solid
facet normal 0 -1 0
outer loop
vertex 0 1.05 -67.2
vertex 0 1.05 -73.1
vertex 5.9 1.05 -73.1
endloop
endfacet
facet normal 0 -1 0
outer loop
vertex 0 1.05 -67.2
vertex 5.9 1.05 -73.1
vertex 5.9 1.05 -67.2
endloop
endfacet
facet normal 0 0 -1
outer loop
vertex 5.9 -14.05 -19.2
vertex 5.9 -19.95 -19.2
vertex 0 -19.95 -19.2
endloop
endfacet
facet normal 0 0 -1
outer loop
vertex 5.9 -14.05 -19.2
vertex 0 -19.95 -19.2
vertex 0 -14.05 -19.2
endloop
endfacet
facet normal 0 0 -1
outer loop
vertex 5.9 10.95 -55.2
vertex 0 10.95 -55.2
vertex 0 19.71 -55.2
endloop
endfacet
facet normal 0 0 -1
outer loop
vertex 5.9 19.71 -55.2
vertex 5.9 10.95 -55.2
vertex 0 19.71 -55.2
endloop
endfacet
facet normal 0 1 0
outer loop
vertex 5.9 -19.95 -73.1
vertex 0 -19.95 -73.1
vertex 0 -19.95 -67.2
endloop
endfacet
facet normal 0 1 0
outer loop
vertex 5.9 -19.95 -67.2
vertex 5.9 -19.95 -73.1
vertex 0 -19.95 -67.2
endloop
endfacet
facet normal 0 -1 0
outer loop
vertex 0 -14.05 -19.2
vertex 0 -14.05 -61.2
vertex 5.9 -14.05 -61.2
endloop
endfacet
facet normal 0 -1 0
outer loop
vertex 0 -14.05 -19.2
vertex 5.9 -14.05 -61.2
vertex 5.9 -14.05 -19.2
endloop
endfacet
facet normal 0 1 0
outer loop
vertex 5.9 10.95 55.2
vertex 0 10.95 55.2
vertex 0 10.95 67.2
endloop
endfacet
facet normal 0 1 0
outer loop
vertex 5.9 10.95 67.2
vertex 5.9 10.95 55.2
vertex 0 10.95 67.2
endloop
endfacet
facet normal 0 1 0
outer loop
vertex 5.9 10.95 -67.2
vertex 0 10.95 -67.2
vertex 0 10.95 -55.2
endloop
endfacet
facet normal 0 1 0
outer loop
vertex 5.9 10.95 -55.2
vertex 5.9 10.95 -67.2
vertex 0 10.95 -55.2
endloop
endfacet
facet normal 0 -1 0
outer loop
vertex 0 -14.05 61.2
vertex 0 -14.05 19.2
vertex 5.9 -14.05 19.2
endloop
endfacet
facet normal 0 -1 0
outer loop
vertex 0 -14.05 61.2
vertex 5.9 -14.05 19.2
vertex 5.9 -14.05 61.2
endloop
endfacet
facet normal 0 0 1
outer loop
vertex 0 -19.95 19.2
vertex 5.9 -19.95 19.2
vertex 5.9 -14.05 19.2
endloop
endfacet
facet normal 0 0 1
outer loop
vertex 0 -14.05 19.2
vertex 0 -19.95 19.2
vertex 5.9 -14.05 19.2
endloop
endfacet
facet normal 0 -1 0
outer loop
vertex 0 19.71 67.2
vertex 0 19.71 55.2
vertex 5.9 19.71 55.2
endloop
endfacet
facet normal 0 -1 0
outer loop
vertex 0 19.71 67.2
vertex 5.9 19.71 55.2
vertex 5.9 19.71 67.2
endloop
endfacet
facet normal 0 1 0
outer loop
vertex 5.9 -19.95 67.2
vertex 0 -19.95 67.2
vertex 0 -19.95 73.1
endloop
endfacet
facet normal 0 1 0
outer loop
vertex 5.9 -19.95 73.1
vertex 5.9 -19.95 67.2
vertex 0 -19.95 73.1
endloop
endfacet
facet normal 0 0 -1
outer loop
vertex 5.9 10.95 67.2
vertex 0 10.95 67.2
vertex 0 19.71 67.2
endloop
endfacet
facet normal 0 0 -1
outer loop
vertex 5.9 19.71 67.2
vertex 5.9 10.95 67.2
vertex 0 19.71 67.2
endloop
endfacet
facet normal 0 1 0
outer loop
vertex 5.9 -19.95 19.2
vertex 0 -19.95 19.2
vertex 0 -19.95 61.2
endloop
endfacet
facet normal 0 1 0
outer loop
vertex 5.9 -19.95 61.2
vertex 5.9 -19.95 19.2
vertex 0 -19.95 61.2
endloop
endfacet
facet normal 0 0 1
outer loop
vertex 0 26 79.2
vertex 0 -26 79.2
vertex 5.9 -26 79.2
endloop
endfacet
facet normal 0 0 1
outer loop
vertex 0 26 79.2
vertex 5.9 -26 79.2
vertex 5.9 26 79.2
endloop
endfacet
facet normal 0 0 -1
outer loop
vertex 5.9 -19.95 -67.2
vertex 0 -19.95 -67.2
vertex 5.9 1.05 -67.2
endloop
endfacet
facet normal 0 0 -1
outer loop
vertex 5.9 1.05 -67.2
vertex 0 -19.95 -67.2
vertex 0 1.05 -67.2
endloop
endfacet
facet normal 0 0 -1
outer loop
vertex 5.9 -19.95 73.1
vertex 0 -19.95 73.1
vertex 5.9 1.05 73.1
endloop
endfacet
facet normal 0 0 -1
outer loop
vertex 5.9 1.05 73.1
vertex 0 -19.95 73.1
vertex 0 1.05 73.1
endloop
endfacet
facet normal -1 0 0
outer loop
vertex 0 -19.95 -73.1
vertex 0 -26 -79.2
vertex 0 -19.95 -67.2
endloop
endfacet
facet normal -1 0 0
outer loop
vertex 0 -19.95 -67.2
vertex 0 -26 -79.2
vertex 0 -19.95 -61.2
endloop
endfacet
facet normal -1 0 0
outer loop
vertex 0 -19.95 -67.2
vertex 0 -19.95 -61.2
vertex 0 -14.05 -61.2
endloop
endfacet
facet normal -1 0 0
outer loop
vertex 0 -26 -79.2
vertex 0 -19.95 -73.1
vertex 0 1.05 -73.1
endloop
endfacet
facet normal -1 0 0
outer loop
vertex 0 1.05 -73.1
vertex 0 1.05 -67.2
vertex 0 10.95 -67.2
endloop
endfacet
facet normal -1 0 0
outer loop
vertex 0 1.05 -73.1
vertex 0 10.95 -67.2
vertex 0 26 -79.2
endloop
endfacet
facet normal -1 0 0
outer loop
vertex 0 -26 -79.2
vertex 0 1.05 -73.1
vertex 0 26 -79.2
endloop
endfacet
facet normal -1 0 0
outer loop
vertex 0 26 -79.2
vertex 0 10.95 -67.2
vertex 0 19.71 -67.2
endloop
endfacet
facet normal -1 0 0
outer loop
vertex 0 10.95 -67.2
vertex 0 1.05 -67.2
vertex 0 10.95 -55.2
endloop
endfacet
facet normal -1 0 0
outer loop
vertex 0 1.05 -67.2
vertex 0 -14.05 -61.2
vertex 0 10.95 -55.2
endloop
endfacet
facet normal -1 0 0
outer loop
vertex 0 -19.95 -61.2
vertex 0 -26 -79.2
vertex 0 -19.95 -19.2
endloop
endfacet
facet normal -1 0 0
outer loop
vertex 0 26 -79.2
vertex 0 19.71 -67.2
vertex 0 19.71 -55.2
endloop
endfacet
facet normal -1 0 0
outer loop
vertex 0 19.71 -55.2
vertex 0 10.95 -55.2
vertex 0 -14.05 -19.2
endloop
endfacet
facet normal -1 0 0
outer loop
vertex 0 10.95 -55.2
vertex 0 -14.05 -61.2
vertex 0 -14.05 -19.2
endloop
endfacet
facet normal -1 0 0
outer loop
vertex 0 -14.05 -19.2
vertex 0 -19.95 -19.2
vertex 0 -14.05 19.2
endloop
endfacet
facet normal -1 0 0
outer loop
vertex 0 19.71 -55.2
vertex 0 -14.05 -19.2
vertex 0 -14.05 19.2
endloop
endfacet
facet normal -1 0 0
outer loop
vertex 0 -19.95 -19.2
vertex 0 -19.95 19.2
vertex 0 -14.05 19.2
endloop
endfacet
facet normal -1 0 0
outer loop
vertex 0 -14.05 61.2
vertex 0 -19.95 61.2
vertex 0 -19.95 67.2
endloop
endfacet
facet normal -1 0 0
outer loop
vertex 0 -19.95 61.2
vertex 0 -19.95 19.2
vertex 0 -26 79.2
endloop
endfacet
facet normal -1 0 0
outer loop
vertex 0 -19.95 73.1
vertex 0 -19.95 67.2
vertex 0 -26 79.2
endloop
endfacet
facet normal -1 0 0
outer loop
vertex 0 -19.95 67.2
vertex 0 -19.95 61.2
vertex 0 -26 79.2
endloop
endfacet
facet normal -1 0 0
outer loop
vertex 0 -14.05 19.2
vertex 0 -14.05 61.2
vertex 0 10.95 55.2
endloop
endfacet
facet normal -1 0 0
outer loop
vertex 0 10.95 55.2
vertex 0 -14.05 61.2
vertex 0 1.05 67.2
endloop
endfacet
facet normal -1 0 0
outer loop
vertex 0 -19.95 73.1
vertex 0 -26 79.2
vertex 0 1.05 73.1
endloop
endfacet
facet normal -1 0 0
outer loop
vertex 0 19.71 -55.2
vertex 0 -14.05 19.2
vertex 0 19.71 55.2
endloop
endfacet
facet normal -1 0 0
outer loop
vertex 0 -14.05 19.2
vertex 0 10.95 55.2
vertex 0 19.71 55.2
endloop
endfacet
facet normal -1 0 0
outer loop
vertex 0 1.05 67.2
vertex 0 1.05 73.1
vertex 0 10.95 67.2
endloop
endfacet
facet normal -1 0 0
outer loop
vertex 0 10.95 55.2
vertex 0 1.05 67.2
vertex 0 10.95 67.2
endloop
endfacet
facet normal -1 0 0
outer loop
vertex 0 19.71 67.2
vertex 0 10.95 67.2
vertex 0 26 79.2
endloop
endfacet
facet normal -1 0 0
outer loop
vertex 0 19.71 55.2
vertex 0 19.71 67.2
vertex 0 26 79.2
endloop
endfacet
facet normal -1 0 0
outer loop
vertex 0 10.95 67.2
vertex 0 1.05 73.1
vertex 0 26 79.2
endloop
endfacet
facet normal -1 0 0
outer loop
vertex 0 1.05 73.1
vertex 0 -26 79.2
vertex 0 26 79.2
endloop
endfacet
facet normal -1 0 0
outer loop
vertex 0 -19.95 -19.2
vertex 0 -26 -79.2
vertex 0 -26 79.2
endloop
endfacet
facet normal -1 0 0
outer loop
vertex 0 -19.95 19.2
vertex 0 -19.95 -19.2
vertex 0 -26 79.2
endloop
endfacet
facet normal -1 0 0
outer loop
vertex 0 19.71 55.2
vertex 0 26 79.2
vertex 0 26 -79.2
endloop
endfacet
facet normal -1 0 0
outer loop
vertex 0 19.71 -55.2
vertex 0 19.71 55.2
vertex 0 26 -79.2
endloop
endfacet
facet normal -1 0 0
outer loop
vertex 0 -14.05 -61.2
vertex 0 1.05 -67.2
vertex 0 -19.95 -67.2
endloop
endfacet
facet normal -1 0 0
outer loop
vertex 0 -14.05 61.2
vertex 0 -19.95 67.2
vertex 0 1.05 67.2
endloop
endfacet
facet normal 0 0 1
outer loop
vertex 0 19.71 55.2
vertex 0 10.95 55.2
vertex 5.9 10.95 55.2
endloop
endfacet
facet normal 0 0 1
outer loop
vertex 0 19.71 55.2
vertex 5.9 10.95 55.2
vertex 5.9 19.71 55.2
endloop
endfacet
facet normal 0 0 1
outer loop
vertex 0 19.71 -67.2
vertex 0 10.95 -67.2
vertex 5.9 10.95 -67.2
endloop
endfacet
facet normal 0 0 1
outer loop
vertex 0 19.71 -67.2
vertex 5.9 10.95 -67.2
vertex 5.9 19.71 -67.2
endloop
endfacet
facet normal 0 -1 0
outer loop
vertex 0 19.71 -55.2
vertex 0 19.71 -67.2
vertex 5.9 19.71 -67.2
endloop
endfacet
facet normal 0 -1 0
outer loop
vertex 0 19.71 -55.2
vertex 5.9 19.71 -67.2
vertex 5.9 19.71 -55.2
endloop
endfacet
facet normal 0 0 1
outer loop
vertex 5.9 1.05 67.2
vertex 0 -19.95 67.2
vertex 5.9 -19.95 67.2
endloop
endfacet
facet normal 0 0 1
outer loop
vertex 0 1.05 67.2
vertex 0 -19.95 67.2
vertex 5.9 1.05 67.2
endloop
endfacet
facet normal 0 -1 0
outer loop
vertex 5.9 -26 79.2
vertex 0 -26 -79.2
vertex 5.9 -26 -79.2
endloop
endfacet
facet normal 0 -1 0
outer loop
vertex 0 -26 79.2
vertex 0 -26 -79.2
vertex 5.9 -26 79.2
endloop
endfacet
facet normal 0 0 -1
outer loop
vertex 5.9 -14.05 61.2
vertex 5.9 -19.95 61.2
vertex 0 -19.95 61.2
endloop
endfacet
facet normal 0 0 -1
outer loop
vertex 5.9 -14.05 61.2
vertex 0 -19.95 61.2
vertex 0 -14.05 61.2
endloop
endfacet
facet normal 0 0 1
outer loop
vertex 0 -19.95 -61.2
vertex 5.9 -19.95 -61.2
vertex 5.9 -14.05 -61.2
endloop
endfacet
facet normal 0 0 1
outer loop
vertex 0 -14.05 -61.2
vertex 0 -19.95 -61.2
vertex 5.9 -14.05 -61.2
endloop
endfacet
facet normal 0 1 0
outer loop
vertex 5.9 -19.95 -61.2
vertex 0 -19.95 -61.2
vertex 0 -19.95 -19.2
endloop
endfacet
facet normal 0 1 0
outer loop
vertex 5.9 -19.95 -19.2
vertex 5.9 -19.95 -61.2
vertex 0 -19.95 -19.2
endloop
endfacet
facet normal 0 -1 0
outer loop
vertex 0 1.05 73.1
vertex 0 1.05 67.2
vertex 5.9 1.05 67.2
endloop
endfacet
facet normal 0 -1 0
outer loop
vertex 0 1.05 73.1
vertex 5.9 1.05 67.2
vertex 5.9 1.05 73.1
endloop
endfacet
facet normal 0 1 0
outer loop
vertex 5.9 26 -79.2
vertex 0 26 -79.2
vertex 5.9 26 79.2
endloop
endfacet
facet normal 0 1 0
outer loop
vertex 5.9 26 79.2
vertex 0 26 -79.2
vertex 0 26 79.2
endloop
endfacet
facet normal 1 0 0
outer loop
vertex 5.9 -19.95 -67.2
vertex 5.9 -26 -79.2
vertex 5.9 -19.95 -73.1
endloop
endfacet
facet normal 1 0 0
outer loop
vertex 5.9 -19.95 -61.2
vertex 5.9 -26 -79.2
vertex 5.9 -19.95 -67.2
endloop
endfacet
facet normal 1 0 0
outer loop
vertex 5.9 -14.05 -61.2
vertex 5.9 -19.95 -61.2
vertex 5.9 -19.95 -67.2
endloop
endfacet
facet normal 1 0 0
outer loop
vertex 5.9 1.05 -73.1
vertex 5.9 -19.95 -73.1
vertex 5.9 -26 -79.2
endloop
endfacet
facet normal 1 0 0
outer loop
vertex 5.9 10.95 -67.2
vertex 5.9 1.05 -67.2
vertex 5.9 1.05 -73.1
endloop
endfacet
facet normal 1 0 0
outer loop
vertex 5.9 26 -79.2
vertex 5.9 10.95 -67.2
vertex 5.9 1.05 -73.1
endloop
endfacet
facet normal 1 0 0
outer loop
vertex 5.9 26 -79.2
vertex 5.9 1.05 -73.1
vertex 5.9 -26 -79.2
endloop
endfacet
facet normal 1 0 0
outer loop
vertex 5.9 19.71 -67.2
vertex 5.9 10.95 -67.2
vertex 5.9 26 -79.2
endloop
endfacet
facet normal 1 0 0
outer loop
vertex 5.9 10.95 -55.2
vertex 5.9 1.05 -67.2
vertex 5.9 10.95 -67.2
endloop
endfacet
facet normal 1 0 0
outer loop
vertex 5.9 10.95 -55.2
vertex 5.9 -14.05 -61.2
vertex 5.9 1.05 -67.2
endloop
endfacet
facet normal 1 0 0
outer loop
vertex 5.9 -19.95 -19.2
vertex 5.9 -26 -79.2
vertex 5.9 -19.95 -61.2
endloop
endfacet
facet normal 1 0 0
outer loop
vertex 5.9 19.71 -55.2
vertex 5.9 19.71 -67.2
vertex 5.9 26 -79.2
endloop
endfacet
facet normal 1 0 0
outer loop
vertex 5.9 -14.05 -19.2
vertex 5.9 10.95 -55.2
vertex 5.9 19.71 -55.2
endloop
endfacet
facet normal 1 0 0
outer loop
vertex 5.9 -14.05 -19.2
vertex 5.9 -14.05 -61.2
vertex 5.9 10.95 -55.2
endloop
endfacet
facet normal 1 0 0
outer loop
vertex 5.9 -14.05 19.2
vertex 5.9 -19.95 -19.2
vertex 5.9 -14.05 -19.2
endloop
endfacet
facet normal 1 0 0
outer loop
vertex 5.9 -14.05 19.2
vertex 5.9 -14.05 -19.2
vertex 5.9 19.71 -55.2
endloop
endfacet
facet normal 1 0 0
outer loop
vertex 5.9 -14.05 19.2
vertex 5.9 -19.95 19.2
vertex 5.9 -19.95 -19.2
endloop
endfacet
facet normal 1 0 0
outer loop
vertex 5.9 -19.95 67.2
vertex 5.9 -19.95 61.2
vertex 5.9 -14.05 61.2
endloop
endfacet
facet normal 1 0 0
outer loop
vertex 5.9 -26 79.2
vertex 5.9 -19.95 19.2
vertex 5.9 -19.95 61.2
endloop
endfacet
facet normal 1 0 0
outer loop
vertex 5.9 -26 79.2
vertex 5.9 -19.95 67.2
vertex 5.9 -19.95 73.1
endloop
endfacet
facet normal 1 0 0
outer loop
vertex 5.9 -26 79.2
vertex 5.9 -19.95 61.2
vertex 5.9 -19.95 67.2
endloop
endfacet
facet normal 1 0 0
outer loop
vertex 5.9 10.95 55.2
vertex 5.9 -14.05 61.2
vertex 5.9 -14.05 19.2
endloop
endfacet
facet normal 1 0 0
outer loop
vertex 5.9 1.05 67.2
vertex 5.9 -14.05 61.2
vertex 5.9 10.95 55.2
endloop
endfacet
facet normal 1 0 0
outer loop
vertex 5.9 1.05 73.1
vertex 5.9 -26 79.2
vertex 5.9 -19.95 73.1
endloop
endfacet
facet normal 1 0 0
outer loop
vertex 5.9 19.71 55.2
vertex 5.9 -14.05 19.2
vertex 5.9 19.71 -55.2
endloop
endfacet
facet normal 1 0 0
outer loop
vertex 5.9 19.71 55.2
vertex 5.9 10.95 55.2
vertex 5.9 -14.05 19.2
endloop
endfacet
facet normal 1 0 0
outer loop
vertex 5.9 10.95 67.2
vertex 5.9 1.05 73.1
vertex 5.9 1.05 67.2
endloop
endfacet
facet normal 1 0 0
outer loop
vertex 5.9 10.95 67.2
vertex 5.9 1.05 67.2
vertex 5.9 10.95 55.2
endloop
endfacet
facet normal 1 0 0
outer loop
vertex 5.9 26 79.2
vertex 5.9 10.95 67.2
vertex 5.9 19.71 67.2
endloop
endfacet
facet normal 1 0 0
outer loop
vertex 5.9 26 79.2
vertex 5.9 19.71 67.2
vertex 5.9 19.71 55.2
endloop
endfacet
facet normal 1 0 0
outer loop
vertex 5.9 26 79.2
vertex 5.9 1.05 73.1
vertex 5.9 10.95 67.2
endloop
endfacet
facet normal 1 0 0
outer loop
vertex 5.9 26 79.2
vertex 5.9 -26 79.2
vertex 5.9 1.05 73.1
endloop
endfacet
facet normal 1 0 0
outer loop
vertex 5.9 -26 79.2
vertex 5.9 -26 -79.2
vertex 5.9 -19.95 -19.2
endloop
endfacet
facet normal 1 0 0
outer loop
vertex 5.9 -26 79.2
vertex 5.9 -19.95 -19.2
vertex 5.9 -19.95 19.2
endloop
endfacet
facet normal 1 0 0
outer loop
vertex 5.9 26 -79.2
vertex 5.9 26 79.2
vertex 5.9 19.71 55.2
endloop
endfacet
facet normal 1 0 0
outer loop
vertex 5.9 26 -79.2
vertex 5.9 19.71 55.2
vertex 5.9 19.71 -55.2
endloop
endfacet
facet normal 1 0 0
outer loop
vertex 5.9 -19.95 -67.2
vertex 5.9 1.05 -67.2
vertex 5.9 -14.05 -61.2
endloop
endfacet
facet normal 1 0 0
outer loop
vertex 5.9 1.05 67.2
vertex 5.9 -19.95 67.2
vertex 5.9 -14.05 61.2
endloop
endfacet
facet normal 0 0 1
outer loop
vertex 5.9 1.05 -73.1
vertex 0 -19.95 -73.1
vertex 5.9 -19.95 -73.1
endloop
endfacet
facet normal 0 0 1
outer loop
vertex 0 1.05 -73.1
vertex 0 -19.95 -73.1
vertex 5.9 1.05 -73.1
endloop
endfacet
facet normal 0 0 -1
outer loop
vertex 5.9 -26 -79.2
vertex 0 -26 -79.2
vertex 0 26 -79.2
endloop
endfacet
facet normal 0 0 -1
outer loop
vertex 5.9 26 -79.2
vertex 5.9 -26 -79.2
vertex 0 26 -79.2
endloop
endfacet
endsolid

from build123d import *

# Parameters (mm, degrees)
F0_W     = 52
F0_H     = 158.4
F0_W_2   = 5.9
F0_H_2   = 42
F0_W_3   = 21
F0_H_3   = 5.9
F0_W_4   = 8.76
F0_H_4   = 12
F1_DEPTH = 5.9


with BuildPart() as f1:
    # F0 (on Right) → F1 (new body)
    with BuildSketch(Plane.YZ):
        Rectangle(F0_W, F0_H)
        with Locations((-17, -40.2)):
            Rectangle(F0_W_2, F0_H_2, mode=Mode.SUBTRACT)
        with Locations((-9.45, -70.15)):
            Rectangle(F0_W_3, F0_H_3, mode=Mode.SUBTRACT)
        with Locations((15.33, -61.2)):
            Rectangle(F0_W_4, F0_H_4, mode=Mode.SUBTRACT)
        with Locations((-17, 40.2)):
            Rectangle(F0_W_2, F0_H_2, mode=Mode.SUBTRACT)
        with Locations((-9.45, 70.15)):
            Rectangle(F0_W_3, F0_H_3, mode=Mode.SUBTRACT)
        with Locations((15.33, 61.2)):
            Rectangle(F0_W_4, F0_H_4, mode=Mode.SUBTRACT)
    extrude(amount=F1_DEPTH)


solid = f1.part
